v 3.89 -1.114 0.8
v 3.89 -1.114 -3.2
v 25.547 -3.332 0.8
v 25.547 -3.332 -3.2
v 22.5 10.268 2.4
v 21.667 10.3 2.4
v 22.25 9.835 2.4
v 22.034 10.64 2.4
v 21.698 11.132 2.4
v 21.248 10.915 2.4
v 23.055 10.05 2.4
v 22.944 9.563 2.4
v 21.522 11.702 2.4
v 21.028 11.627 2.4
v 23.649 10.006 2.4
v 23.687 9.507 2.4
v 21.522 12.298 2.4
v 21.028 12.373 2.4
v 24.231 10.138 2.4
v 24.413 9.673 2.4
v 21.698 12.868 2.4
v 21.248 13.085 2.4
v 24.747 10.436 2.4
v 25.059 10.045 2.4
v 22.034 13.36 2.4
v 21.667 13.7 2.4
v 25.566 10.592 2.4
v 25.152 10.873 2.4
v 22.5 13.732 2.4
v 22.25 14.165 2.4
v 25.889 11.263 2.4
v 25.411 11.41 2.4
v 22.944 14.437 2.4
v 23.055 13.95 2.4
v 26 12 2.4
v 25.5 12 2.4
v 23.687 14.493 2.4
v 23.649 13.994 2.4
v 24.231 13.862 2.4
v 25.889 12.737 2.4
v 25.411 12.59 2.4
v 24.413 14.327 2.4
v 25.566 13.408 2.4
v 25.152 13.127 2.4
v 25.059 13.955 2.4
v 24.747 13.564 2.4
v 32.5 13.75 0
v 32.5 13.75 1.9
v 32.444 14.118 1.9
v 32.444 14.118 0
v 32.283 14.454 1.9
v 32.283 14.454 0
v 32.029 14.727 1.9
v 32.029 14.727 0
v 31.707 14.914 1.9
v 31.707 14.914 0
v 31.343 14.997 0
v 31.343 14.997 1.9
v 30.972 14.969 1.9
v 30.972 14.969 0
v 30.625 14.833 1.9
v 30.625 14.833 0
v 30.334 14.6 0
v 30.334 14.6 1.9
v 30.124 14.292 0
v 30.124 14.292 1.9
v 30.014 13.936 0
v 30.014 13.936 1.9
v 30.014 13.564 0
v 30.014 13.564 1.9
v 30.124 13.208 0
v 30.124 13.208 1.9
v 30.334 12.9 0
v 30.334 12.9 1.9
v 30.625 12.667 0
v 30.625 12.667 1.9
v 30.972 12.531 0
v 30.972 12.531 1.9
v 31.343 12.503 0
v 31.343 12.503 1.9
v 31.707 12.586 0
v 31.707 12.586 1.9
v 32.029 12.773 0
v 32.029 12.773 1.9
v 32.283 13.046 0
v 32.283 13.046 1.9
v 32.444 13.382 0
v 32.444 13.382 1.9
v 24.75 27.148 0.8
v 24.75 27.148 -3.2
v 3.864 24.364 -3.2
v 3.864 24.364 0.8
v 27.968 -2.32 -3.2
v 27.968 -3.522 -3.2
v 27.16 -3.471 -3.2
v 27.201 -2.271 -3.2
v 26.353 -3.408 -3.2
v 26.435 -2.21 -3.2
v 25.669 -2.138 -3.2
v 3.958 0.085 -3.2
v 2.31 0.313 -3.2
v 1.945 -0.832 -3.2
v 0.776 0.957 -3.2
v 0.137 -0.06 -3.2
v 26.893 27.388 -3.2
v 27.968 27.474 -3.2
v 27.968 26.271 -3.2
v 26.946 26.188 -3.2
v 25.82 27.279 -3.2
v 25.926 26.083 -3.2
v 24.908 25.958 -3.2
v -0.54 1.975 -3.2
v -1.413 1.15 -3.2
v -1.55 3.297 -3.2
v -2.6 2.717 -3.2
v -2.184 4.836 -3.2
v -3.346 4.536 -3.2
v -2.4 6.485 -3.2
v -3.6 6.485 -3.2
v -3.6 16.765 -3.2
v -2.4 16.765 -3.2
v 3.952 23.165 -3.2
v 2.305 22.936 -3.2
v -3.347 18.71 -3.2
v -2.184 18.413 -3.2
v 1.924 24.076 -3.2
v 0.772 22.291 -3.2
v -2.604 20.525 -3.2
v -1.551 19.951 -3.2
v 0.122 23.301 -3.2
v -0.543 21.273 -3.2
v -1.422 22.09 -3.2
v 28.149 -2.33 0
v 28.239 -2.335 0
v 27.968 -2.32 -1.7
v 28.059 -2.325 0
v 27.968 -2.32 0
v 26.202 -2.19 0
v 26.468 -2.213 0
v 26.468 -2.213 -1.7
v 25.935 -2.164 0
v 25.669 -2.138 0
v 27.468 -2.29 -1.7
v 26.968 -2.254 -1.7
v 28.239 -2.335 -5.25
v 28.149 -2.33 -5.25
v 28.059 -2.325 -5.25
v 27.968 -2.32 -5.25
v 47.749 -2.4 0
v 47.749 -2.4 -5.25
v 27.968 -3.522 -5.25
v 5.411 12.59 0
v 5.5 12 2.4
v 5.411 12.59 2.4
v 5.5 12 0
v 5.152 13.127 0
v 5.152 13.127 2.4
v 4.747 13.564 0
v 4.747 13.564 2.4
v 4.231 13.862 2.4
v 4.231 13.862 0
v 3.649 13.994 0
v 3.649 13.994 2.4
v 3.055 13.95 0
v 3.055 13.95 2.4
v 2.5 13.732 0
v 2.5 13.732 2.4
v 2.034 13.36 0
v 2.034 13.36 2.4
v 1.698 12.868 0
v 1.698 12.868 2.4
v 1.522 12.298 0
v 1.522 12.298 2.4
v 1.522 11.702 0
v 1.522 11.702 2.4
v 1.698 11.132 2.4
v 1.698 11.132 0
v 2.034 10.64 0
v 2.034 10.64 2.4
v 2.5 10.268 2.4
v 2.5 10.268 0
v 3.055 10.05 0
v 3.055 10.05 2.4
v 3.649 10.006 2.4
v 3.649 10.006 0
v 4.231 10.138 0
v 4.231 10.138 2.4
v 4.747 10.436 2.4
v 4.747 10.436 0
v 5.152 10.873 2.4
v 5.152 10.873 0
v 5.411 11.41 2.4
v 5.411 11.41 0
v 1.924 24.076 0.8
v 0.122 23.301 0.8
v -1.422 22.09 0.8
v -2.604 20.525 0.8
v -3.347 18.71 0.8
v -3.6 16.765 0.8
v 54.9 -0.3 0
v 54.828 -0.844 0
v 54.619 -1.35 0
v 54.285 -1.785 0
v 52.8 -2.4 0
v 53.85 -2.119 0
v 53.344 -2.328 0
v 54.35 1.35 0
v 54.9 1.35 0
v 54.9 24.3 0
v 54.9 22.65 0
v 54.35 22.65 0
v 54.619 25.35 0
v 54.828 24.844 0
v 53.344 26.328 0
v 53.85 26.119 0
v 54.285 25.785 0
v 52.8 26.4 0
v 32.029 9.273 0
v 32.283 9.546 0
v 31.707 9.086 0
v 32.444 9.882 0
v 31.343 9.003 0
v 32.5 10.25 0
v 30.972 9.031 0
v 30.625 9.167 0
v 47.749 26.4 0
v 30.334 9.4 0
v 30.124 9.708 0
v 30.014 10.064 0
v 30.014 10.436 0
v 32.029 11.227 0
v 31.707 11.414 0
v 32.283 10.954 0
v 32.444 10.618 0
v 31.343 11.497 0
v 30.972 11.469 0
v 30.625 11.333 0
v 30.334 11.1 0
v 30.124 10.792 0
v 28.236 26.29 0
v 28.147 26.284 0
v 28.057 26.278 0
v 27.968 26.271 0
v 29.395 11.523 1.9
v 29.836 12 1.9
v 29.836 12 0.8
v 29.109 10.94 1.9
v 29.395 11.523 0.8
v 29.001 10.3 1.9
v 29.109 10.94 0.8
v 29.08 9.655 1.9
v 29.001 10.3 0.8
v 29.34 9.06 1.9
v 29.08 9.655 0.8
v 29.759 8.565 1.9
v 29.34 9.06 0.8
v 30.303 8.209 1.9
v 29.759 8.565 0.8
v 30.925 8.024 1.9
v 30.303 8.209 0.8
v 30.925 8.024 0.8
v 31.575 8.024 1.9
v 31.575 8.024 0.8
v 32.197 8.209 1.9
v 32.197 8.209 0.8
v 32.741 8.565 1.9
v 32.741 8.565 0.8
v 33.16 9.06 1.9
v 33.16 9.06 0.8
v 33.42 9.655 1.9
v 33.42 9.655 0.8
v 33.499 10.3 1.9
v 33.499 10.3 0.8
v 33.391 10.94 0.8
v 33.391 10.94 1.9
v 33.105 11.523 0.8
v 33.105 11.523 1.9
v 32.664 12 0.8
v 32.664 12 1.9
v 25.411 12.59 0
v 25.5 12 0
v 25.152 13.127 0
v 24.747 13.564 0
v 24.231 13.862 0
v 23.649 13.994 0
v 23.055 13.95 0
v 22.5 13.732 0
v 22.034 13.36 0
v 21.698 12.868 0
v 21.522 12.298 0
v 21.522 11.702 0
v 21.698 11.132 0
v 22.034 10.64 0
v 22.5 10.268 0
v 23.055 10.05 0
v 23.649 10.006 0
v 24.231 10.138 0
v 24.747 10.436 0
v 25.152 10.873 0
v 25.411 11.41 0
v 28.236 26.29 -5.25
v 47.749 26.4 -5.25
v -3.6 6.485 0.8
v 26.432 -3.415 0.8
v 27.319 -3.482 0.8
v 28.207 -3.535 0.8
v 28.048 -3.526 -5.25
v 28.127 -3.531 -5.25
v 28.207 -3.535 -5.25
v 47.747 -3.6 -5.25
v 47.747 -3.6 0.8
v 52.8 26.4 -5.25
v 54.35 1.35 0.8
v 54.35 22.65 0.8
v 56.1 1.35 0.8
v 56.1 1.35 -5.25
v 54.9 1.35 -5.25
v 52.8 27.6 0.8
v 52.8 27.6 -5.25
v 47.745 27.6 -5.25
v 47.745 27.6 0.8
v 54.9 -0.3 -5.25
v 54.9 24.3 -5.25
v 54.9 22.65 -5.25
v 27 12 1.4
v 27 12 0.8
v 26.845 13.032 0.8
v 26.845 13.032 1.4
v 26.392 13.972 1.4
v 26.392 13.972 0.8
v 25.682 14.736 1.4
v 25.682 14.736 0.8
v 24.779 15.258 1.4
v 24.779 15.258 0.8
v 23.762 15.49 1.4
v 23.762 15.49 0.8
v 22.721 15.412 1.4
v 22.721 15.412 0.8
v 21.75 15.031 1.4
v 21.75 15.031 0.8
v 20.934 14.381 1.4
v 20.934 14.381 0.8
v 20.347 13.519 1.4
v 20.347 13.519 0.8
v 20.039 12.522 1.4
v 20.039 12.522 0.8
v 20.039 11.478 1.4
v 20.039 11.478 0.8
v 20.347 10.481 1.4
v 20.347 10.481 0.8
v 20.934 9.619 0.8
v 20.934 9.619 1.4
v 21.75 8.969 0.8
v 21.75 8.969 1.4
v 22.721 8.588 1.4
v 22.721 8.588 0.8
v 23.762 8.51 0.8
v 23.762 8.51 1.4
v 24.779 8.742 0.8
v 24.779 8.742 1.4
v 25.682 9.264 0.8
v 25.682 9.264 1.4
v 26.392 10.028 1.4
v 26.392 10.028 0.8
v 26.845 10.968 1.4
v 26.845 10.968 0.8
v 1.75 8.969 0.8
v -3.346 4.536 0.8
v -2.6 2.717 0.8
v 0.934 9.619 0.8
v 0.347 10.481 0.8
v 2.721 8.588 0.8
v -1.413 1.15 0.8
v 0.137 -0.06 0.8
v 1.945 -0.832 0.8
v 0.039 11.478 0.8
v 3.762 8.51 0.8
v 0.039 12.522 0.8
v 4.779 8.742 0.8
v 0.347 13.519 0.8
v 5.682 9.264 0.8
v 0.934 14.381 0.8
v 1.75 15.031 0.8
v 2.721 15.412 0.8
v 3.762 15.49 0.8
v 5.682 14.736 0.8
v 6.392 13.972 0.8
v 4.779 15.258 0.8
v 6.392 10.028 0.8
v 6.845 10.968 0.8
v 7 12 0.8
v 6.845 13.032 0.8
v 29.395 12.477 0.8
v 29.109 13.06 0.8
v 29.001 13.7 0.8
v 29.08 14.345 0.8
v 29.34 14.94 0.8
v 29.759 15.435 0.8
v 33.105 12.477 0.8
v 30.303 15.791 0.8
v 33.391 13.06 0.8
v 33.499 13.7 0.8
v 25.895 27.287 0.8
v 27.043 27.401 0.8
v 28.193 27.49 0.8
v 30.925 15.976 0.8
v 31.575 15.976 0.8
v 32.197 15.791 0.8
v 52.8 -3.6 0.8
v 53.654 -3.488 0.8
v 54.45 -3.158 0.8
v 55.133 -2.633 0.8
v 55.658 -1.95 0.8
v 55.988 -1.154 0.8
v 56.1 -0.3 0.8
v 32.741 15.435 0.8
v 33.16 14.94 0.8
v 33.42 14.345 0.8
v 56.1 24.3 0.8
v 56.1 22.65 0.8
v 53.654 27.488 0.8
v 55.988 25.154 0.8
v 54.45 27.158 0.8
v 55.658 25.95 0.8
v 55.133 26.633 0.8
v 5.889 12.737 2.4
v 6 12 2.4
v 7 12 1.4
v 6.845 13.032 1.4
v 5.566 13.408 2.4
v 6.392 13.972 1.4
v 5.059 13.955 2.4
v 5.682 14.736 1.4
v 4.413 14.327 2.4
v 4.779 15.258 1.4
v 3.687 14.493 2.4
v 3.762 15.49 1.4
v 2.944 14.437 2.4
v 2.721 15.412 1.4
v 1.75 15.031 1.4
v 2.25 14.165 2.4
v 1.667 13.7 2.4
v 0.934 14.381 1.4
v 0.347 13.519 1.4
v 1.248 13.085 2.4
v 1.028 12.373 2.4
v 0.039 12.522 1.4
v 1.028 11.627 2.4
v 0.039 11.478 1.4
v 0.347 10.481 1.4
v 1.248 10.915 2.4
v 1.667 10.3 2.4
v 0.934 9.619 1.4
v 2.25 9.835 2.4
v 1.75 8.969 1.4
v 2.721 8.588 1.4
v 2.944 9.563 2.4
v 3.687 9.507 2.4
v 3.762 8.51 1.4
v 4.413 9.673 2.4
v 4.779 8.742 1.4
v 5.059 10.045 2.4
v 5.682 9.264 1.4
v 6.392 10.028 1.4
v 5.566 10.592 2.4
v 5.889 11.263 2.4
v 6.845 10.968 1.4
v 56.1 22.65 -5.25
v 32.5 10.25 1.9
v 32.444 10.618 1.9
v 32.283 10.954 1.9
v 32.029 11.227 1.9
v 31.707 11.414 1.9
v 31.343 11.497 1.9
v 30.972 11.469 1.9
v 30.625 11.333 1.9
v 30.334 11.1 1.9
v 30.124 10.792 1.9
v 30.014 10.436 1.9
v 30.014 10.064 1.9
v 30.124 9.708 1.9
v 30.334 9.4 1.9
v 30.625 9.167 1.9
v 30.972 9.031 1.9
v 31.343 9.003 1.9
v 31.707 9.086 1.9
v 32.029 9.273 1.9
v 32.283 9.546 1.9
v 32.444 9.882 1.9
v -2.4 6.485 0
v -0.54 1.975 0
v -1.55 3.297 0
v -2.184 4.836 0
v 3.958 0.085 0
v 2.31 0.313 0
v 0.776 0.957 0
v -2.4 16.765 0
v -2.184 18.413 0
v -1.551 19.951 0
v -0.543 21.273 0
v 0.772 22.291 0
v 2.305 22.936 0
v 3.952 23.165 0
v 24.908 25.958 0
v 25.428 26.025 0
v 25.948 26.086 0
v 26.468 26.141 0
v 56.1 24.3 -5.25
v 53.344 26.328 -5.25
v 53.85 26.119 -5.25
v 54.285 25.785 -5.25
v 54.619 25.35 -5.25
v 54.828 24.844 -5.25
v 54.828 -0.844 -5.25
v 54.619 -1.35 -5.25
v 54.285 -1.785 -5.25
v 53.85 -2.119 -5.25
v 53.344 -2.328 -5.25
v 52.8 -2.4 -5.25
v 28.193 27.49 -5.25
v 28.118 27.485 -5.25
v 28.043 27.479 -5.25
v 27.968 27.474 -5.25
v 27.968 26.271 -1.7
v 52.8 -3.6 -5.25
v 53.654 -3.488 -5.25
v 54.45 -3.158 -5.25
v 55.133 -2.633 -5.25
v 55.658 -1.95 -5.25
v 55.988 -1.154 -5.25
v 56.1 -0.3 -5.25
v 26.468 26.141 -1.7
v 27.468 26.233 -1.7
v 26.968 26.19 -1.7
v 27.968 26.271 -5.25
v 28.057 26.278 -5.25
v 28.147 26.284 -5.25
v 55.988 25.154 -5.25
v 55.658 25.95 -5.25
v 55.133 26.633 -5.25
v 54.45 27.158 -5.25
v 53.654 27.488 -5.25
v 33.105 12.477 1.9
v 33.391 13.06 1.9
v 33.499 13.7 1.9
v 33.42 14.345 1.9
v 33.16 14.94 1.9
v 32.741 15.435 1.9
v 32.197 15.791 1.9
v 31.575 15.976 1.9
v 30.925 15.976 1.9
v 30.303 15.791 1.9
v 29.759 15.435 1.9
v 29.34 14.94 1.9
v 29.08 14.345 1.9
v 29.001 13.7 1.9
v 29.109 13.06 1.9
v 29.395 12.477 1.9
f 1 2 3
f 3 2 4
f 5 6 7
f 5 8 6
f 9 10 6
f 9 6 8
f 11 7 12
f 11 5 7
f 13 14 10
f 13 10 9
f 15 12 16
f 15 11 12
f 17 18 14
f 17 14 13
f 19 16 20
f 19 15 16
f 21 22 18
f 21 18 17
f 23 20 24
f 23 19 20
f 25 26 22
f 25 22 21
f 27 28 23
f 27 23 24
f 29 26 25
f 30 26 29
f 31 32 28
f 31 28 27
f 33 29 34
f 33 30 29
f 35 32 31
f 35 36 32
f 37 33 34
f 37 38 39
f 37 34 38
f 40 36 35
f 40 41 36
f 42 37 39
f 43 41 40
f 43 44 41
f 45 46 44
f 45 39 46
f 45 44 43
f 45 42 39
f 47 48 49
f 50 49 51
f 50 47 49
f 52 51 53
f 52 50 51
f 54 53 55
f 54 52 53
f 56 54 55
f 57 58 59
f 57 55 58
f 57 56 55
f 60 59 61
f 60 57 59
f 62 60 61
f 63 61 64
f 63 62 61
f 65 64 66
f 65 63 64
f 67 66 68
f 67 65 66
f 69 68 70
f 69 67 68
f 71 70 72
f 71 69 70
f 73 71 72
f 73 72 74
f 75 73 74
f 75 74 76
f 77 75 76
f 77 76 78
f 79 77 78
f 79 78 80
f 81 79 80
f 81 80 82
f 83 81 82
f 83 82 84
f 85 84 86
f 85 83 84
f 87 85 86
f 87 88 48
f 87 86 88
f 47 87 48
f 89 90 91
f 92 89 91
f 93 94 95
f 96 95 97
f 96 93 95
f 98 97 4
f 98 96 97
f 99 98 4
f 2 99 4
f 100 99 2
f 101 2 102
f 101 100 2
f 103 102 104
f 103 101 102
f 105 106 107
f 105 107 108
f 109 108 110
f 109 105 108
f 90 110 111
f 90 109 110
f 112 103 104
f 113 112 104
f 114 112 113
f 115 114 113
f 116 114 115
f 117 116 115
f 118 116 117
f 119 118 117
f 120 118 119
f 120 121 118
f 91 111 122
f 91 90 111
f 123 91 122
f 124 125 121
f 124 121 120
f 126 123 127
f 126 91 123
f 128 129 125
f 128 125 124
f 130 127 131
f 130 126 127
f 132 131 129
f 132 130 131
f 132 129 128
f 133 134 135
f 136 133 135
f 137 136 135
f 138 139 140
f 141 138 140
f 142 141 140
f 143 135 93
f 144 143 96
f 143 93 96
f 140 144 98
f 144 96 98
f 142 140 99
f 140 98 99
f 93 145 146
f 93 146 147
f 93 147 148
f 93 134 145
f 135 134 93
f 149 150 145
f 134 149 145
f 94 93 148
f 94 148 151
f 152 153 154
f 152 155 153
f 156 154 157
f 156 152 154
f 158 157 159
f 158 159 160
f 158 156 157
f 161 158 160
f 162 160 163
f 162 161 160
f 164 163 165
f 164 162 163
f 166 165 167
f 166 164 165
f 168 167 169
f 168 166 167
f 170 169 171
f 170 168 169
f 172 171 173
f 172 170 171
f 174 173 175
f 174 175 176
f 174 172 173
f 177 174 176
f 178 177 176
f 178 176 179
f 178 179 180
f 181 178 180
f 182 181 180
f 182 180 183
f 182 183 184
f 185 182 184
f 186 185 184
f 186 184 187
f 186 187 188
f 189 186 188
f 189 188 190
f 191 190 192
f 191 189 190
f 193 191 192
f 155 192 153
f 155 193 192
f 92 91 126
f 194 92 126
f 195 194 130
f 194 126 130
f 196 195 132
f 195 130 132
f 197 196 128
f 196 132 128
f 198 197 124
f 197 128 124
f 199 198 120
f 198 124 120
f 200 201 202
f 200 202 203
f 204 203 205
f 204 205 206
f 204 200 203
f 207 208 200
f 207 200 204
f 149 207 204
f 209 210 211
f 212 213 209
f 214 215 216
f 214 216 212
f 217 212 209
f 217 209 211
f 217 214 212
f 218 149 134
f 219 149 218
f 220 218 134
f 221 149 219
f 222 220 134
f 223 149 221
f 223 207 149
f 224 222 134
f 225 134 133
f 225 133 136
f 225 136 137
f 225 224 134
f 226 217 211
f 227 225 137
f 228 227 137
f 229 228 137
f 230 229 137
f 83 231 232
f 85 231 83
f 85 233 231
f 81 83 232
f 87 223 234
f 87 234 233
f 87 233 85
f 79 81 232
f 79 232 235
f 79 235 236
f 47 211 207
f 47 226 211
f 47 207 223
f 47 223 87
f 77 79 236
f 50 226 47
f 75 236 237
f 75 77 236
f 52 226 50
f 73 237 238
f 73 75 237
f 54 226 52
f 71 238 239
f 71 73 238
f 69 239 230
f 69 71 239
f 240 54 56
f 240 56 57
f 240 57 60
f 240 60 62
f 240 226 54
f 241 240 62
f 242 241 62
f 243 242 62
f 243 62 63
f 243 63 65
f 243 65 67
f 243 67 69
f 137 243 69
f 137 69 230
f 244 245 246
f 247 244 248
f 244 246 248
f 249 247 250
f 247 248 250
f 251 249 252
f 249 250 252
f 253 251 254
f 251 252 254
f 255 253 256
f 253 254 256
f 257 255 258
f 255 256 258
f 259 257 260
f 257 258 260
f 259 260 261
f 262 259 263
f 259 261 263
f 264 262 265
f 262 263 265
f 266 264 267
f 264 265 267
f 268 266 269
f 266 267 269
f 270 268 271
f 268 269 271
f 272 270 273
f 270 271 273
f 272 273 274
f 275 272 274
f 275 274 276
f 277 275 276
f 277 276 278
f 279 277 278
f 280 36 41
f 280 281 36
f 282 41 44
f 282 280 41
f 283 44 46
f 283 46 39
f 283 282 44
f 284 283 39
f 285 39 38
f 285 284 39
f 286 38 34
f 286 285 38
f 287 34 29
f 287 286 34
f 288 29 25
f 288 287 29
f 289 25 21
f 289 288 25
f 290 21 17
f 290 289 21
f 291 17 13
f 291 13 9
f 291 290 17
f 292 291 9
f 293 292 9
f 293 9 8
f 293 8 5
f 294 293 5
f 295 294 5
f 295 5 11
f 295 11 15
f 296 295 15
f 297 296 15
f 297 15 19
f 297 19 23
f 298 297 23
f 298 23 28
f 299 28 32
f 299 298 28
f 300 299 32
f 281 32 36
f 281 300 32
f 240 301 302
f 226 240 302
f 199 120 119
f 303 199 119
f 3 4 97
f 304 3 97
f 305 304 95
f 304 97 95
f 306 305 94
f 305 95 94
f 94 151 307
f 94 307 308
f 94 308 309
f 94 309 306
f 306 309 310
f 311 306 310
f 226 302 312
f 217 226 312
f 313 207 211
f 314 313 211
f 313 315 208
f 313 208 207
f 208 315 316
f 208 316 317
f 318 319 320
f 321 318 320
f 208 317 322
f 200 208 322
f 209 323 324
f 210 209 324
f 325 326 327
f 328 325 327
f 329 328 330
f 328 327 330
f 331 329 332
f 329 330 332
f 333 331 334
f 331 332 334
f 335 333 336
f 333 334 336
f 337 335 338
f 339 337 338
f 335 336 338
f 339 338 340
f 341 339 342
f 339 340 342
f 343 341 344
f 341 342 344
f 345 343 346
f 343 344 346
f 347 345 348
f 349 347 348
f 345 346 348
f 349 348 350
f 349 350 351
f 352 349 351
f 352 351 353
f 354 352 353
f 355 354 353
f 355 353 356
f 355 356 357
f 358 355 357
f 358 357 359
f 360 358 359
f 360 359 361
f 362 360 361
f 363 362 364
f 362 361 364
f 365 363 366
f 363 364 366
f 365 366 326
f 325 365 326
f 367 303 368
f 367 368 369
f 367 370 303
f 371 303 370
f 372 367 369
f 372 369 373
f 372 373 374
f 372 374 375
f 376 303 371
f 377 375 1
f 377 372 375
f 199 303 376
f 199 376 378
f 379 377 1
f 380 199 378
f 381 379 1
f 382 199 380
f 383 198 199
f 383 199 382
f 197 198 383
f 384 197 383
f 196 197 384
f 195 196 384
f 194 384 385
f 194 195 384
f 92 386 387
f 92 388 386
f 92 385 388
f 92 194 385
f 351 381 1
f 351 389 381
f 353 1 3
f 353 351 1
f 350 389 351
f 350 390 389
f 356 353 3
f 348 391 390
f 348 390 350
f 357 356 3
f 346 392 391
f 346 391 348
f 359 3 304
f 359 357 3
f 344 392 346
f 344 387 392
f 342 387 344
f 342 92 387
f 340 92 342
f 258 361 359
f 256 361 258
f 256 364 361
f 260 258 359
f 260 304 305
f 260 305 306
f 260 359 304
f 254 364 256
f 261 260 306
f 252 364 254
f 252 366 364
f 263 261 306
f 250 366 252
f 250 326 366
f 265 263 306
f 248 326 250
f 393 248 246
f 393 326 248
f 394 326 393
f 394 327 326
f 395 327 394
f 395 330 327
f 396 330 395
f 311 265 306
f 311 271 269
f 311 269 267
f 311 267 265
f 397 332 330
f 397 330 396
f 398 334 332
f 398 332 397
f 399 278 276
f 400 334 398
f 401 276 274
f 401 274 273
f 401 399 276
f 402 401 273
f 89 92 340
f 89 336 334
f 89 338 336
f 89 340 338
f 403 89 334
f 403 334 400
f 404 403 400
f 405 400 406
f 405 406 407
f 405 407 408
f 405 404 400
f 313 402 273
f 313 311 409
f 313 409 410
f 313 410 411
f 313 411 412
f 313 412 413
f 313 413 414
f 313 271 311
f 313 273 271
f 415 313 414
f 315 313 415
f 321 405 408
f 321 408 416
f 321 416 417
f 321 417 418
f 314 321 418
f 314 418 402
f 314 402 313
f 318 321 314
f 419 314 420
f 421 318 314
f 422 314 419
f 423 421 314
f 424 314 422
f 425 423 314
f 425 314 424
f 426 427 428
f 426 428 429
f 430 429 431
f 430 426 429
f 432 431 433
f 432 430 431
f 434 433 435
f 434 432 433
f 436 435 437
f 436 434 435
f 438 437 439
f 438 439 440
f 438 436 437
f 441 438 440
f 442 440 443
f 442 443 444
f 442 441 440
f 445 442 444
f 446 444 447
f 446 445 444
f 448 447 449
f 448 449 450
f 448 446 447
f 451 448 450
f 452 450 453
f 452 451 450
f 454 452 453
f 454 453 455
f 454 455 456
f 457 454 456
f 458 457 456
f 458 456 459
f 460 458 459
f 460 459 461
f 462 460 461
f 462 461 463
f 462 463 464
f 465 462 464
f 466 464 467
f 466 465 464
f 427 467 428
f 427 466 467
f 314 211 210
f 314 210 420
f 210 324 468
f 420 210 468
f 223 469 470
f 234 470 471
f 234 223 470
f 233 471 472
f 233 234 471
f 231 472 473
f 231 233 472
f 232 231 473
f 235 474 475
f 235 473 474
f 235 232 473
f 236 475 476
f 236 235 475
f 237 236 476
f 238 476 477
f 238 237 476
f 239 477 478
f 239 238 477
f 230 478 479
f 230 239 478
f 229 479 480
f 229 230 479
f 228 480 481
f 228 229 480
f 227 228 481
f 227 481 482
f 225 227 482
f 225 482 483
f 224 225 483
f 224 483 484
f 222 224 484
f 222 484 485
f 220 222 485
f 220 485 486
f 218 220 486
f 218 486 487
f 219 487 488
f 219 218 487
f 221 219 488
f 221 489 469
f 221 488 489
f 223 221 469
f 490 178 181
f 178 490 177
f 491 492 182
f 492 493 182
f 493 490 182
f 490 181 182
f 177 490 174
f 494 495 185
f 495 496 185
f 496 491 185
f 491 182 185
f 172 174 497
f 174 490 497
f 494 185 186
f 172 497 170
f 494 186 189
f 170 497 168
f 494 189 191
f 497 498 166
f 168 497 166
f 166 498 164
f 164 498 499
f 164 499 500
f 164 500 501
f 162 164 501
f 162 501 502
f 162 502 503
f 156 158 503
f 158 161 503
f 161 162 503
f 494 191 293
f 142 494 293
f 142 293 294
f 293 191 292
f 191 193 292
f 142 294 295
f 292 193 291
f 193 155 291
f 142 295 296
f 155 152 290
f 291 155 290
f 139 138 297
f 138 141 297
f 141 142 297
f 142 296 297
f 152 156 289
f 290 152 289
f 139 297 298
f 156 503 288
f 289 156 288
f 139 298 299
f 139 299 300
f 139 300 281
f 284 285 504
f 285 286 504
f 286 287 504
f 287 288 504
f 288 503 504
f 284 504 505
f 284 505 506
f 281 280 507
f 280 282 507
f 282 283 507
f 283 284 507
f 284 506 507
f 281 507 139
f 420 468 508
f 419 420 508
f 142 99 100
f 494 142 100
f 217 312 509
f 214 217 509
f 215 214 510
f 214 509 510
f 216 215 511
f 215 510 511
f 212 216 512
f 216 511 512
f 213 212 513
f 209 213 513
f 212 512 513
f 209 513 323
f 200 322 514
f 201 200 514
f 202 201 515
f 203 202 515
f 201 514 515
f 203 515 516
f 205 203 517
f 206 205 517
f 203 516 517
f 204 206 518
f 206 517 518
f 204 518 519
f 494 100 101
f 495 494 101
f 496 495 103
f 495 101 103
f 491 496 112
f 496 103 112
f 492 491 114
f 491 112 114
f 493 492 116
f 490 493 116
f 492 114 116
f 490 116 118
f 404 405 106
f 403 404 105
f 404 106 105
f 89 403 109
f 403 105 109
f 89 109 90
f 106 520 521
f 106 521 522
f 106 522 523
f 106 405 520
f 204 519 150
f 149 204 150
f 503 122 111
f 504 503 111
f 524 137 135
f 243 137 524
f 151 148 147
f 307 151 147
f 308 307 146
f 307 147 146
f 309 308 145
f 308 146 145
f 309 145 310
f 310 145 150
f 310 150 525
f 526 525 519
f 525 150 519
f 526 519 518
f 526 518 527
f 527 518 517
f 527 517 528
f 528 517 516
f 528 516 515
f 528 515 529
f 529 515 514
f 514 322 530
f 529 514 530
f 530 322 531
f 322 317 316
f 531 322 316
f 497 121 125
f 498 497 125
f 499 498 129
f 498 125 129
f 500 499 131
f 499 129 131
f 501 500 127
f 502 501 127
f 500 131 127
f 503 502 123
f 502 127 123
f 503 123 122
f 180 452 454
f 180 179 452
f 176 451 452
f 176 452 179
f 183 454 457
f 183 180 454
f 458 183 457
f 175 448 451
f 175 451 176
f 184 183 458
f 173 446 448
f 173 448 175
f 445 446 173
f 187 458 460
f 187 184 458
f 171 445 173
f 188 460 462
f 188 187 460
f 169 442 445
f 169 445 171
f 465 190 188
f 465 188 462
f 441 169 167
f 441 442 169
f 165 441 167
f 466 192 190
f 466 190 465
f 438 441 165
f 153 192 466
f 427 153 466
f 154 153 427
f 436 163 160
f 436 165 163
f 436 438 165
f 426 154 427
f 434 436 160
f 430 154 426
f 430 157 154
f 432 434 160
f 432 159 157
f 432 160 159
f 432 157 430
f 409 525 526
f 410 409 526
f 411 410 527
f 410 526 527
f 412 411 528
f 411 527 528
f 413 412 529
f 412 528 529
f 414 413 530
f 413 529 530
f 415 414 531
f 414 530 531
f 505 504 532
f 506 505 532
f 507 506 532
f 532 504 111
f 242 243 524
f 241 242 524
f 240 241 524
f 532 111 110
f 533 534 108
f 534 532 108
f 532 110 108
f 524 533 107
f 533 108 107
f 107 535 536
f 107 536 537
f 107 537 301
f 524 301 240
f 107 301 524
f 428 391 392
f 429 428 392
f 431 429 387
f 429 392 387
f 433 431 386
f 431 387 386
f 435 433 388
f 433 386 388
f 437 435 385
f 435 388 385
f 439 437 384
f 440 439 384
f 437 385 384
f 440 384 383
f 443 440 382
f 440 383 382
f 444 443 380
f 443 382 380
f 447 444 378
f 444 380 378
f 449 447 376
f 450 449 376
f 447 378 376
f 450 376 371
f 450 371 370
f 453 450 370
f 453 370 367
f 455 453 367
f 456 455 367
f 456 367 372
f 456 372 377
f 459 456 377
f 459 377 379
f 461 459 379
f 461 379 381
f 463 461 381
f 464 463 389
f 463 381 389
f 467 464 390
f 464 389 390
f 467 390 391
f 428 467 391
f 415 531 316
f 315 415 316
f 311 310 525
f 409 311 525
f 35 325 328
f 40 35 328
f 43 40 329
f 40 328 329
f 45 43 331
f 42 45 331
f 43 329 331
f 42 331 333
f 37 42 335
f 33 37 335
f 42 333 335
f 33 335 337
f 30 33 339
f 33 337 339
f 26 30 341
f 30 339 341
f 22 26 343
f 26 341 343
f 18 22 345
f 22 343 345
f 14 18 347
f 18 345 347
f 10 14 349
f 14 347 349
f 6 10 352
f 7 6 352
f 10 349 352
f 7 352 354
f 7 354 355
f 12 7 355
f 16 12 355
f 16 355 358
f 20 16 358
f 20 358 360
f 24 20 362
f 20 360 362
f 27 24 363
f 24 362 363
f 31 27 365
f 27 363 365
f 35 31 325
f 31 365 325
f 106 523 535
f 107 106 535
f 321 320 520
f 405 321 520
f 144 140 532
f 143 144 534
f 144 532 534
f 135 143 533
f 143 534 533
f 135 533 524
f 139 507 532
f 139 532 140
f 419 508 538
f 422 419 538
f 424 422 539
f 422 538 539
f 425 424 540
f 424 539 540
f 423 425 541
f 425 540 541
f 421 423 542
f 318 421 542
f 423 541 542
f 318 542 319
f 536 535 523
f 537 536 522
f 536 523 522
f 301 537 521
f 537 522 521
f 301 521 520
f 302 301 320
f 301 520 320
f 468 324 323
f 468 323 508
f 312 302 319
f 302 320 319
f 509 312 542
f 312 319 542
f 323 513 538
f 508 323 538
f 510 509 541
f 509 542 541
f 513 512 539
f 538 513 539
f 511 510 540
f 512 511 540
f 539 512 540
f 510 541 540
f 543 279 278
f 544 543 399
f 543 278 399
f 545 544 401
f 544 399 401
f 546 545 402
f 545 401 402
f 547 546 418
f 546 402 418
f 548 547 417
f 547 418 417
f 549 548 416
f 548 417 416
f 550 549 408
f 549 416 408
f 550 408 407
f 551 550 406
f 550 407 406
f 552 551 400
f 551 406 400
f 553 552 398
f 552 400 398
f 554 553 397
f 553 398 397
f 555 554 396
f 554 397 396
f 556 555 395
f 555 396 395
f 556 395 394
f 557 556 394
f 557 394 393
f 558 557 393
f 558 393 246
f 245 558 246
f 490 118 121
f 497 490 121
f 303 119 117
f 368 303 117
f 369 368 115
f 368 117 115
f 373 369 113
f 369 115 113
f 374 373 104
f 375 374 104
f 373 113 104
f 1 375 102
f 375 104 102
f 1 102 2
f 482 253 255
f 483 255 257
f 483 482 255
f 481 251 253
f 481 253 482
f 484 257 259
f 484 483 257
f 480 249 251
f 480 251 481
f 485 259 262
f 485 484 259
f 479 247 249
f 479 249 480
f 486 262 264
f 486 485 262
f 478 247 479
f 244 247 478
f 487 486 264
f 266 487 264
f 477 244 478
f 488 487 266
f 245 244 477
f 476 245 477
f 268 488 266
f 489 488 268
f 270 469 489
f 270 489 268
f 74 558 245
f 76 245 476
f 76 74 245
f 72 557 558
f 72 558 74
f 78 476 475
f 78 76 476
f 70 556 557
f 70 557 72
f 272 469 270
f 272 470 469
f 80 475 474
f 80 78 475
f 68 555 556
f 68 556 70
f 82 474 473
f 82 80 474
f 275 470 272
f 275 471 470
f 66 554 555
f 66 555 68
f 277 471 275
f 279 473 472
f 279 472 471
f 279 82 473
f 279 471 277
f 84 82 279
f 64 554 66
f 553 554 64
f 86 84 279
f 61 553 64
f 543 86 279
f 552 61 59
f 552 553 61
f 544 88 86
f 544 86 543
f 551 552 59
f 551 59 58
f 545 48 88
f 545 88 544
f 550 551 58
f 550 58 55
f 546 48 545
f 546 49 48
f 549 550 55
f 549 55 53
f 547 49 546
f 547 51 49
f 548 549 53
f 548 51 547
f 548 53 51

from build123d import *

# Parameters (mm, degrees)
SKETCH1_R           = 2
SKETCH1_R_2         = 1.25
BOSS_EXTRUDE1_DEPTH = 0.8
BOSS_EXTRUDE2_DEPTH = 1.7
BOSS_EXTRUDE5_START = -5.25
BOSS_EXTRUDE5_DEPTH = 5.25
CUT_EXTRUDE1_DEPTH  = 2.05
CUT_EXTRUDE2_DEPTH  = 5.25
SKETCH4_R           = 3.5
SKETCH4_R_2         = 2
SKETCH4_R_3         = 2.25
SKETCH4_R_4         = 1.25
BOSS_EXTRUDE6_DEPTH = 1.6
CHAMFER1_SIZE       = 1
CUT_EXTRUDE3_START  = -0.5
CUT_EXTRUDE3_DEPTH  = 0.5


with BuildPart() as part:
    # Sketch1 → Boss-Extrude1 (new body)
    with BuildSketch(Plane.XY):
        with BuildLine():
            Line((47.747323671, -3.6), (52.8, -3.6))
            ThreePointArc((52.8, -3.6), (55.133452378, -2.633452378), (56.1, -0.3))
            Line((56.1, -0.3), (56.1, 1.35))
            Line((56.1, 1.35), (54.35, 1.35))
            Line((54.35, 1.35), (54.35, 22.65))
            Line((54.35, 22.65), (56.1, 22.65))
            Line((56.1, 22.65), (56.1, 24.3))
            ThreePointArc((56.1, 24.3), (55.133452378, 26.633452378), (52.8, 27.6))
            Line((52.8, 27.6), (47.745478955, 27.6))
            Line((47.745478955, 27.6), (28.192723723, 27.48950052))
            ThreePointArc((28.192723723, 27.48950052), (26.4684207, 27.34740533), (24.749850743, 27.147582262))
            Line((24.749850743, 27.147582262), (3.864159561, 24.363517328))
            ThreePointArc((3.864159561, 24.363517328), (-1.421825677, 22.090499558), (-3.6, 16.764731413))
            Line((-3.6, 16.764731413), (-3.6, 6.485268587))
            ThreePointArc((-3.6, 6.485268587), (-1.412746343, 1.150273083), (3.890046585, -1.113935993))
            Line((3.890046585, -1.113935993), (25.547001239, -3.33158265))
            ThreePointArc((25.547001239, -3.33158265), (26.875561897, -3.450295565), (28.206747131, -3.534628551))
            Line((28.206747131, -3.534628551), (47.747323671, -3.6))
        make_face()
        with Locations((3.5, 12)):
            Circle(SKETCH1_R, mode=Mode.SUBTRACT)
        with Locations((23.5, 12)):
            Circle(SKETCH1_R, mode=Mode.SUBTRACT)
        with Locations((31.25, 13.75)):
            Circle(SKETCH1_R_2, mode=Mode.SUBTRACT)
        with Locations((31.25, 10.25)):
            Circle(SKETCH1_R_2, mode=Mode.SUBTRACT)
    extrude(amount=BOSS_EXTRUDE1_DEPTH)

    # Sketch1<3> → Boss-Extrude2 (add)
    with BuildSketch(Plane.XY):
        with BuildLine():
            Line((27.968417848, -1.919570033), (27.968417848, 25.870274099))
            ThreePointArc((27.968417848, 25.870274099), (27.217924724, 25.810423929), (26.468417848, 25.739280302))
            Line((26.468417848, 25.739280302), (26.468417848, -1.811733972))
            ThreePointArc((26.468417848, -1.811733972), (27.218012396, -1.871291838), (27.968417848, -1.919570033))
        make_face()
        with BuildLine():
            Line((27.968417848, -2.320209383), (27.968417848, -1.919570033))
            ThreePointArc((27.968417848, -1.919570033), (27.218012396, -1.871291838), (26.468417848, -1.811733972))
            Line((26.468417848, -1.811733972), (26.468417848, -2.213233726))
            ThreePointArc((26.468417848, -2.213233726), (27.21801884, -2.272316396), (27.968417848, -2.320209383))
        make_face()
        with BuildLine():
            ThreePointArc((26.468417848, 25.739280302), (27.217924724, 25.810423929), (27.968417848, 25.870274099))
            Line((27.968417848, 25.870274099), (27.968417848, 26.271306316))
            ThreePointArc((27.968417848, 26.271306316), (27.21793258, 26.21193484), (26.468417848, 26.141360223))
            Line((26.468417848, 26.141360223), (26.468417848, 25.739280302))
        make_face()
    extrude(amount=-BOSS_EXTRUDE2_DEPTH)

    # Sketch1<4> → Boss-Extrude5 (add)
    with BuildSketch(Plane.XY.offset(BOSS_EXTRUDE5_START)):
        with BuildLine():
            Line((28.206747131, -3.534628551), (47.747323671, -3.6))
            Line((47.747323671, -3.6), (52.8, -3.6))
            ThreePointArc((52.8, -3.6), (55.133452378, -2.633452378), (56.1, -0.3))
            Line((56.1, -0.3), (56.1, 1.35))
            Line((56.1, 1.35), (54.35, 1.35))
            Line((54.35, 1.35), (54.35, 22.65))
            Line((54.35, 22.65), (56.1, 22.65))
            Line((56.1, 22.65), (56.1, 24.3))
            ThreePointArc((56.1, 24.3), (55.133452378, 26.633452378), (52.8, 27.6))
            Line((52.8, 27.6), (47.745478955, 27.6))
            Line((47.745478955, 27.6), (28.192723723, 27.48950052))
            ThreePointArc((28.192723723, 27.48950052), (26.4684207, 27.34740533), (24.749850743, 27.147582262))
            Line((24.749850743, 27.147582262), (3.864159561, 24.363517328))
            ThreePointArc((3.864159561, 24.363517328), (-1.421825677, 22.090499558), (-3.6, 16.764731413))
            Line((-3.6, 16.764731413), (-3.6, 6.485268587))
            ThreePointArc((-3.6, 6.485268587), (-1.412746343, 1.150273083), (3.890046585, -1.113935993))
            Line((3.890046585, -1.113935993), (25.547001239, -3.33158265))
            ThreePointArc((25.547001239, -3.33158265), (26.875561897, -3.450295565), (28.206747131, -3.534628551))
        make_face()
        with BuildLine():
            Line((28.235609368, 26.289723719), (47.748869739, 26.4))
            Line((47.748869739, 26.4), (52.8, 26.4))
            ThreePointArc((52.8, 26.4), (54.28492424, 25.78492424), (54.9, 24.3))
            Line((54.9, 24.3), (54.9, 23.85))
            Line((54.9, 23.85), (53.15, 23.85))
            Line((53.15, 23.85), (53.15, 0.15))
            Line((53.15, 0.15), (54.9, 0.15))
            Line((54.9, 0.15), (54.9, -0.3))
            ThreePointArc((54.9, -0.3), (54.28492424, -1.78492424), (52.8, -2.4))
            Line((52.8, -2.4), (47.749330923, -2.4))
            Line((47.749330923, -2.4), (28.239130572, -2.334730172))
            ThreePointArc((28.239130572, -2.334730172), (26.952926693, -2.252708036), (25.669240626, -2.137824914))
            Line((25.669240626, -2.137824914), (3.957730332, 0.085408176))
            ThreePointArc((3.957730332, 0.085408176), (-0.540403389, 1.974754529), (-2.4, 6.485268587))
            Line((-2.4, 6.485268587), (-2.4, 16.764731413))
            ThreePointArc((-2.4, 16.764731413), (-0.542592126, 21.273041161), (3.951517744, 23.164547776))
            Line((3.951517744, 23.164547776), (24.908408379, 25.958103605))
            ThreePointArc((24.908408379, 25.958103605), (26.569258033, 26.151513311), (28.235609368, 26.289723719))
        make_face(mode=Mode.SUBTRACT)
    extrude(amount=BOSS_EXTRUDE5_DEPTH)

    # Sketch2 → Cut-Extrude1 (cut)
    with BuildSketch(Plane(origin=(0, 0, -5.25), x_dir=(-1, 0, 0), z_dir=(0, 0, -1))):
        with BuildLine():
            Line((-27.968417848, 27.474306588), (-27.968417848, 26.271306316))
            ThreePointArc((-27.968417848, 26.271306316), (-26.436023146, 26.138055085), (-24.908408379, 25.958103605))
            Line((-24.908408379, 25.958103605), (-3.951517744, 23.164547776))
            ThreePointArc((-3.951517744, 23.164547776), (0.542592126, 21.273041161), (2.4, 16.764731413))
            Line((2.4, 16.764731413), (2.4, 6.485268587))
            ThreePointArc((2.4, 6.485268587), (0.540403389, 1.974754529), (-3.957730332, 0.085408176))
            Line((-3.957730332, 0.085408176), (-25.669240626, -2.137824914))
            ThreePointArc((-25.669240626, -2.137824914), (-26.817785818, -2.24217071), (-27.968417848, -2.320209383))
            Line((-27.968417848, -2.320209383), (-27.968417848, -3.522067819))
            ThreePointArc((-27.968417848, -3.522067819), (-26.756588582, -3.441074719), (-25.547001239, -3.33158265))
            Line((-25.547001239, -3.33158265), (-3.890046585, -1.113935993))
            ThreePointArc((-3.890046585, -1.113935993), (1.412746343, 1.150273083), (3.6, 6.485268587))
            Line((3.6, 6.485268587), (3.6, 16.764731413))
            ThreePointArc((3.6, 16.764731413), (1.421825677, 22.090499558), (-3.864159561, 24.363517328))
            Line((-3.864159561, 24.363517328), (-24.749850743, 27.147582262))
            ThreePointArc((-24.749850743, 27.147582262), (-26.356573132, 27.336174491), (-27.968417848, 27.474306588))
        make_face()
        with BuildLine():
            ThreePointArc((-24.908408379, 25.958103605), (-26.436023146, 26.138055085), (-27.968417848, 26.271306316))
            Line((-27.968417848, 26.271306316), (-27.968417848, -2.320209383))
            ThreePointArc((-27.968417848, -2.320209383), (-26.817785818, -2.24217071), (-25.669240626, -2.137824914))
            Line((-25.669240626, -2.137824914), (-3.957730332, 0.085408176))
            ThreePointArc((-3.957730332, 0.085408176), (0.540403389, 1.974754529), (2.4, 6.485268587))
            Line((2.4, 6.485268587), (2.4, 16.764731413))
            ThreePointArc((2.4, 16.764731413), (0.542592126, 21.273041161), (-3.951517744, 23.164547776))
            Line((-3.951517744, 23.164547776), (-24.908408379, 25.958103605))
        make_face()
    extrude(amount=-CUT_EXTRUDE1_DEPTH, mode=Mode.SUBTRACT)

    # Sketch3 → Cut-Extrude2 (cut)
    with BuildSketch(Plane(origin=(0, 0, -5.25), x_dir=(-1, 0, 0), z_dir=(0, 0, -1))):
        Polygon((-53.15, 23.85), (-54.9, 23.85), (-54.9, 22.65), (-54.35, 22.65), (-54.35, 1.35), (-54.9, 1.35), (-54.9, 0.15), (-53.15, 0.15), align=None)
    extrude(amount=-CUT_EXTRUDE2_DEPTH, mode=Mode.SUBTRACT)

    # Sketch4 → Boss-Extrude6 (add)
    # profile 1 of 4: a face of its own
    with BuildSketch(Plane.XY.offset(0.8)):
        with Locations((3.5, 12)):
            Circle(SKETCH4_R)
        with Locations((3.5, 12)):
            Circle(SKETCH4_R_2, mode=Mode.SUBTRACT)
    # profile 2 of 4: a face of its own
    with BuildSketch(Plane.XY.offset(0.8)):
        with Locations((23.5, 12)):
            Circle(SKETCH4_R)
        with Locations((23.5, 12)):
            Circle(SKETCH4_R_2, mode=Mode.SUBTRACT)
    # profile 3 of 4: a face of its own
    with BuildSketch(Plane.XY.offset(0.8)):
        with Locations((31.25, 13.75)):
            Circle(SKETCH4_R_3)
        with Locations((31.25, 13.75)):
            Circle(SKETCH4_R_4, mode=Mode.SUBTRACT)
    # profile 4 of 4: a face of its own
    with BuildSketch(Plane.XY.offset(0.8)):
        with Locations((31.25, 10.25)):
            Circle(SKETCH4_R_3)
        with Locations((31.25, 10.25)):
            Circle(SKETCH4_R_4, mode=Mode.SUBTRACT)
    extrude(amount=BOSS_EXTRUDE6_DEPTH)

    # Chamfer1
    chamfer1_edges = [part.edges().sort_by_distance(p)[0] for p in [
        (0, 12, 2.4),
        (20, 12, 2.4),
    ]]
    chamfer(chamfer1_edges, length=CHAMFER1_SIZE)

    # Sketch5 → Cut-Extrude3 (cut)
    with BuildSketch(Plane.XY.offset(2.4).offset(CUT_EXTRUDE3_START)):
        with BuildLine():
            ThreePointArc((32.664213562, 12), (31.25, 16), (29.835786438, 12))
            ThreePointArc((29.835786438, 12), (31.25, 8), (32.664213562, 12))
        make_face()
    extrude(amount=CUT_EXTRUDE3_DEPTH, mode=Mode.SUBTRACT)


solid = part.part
